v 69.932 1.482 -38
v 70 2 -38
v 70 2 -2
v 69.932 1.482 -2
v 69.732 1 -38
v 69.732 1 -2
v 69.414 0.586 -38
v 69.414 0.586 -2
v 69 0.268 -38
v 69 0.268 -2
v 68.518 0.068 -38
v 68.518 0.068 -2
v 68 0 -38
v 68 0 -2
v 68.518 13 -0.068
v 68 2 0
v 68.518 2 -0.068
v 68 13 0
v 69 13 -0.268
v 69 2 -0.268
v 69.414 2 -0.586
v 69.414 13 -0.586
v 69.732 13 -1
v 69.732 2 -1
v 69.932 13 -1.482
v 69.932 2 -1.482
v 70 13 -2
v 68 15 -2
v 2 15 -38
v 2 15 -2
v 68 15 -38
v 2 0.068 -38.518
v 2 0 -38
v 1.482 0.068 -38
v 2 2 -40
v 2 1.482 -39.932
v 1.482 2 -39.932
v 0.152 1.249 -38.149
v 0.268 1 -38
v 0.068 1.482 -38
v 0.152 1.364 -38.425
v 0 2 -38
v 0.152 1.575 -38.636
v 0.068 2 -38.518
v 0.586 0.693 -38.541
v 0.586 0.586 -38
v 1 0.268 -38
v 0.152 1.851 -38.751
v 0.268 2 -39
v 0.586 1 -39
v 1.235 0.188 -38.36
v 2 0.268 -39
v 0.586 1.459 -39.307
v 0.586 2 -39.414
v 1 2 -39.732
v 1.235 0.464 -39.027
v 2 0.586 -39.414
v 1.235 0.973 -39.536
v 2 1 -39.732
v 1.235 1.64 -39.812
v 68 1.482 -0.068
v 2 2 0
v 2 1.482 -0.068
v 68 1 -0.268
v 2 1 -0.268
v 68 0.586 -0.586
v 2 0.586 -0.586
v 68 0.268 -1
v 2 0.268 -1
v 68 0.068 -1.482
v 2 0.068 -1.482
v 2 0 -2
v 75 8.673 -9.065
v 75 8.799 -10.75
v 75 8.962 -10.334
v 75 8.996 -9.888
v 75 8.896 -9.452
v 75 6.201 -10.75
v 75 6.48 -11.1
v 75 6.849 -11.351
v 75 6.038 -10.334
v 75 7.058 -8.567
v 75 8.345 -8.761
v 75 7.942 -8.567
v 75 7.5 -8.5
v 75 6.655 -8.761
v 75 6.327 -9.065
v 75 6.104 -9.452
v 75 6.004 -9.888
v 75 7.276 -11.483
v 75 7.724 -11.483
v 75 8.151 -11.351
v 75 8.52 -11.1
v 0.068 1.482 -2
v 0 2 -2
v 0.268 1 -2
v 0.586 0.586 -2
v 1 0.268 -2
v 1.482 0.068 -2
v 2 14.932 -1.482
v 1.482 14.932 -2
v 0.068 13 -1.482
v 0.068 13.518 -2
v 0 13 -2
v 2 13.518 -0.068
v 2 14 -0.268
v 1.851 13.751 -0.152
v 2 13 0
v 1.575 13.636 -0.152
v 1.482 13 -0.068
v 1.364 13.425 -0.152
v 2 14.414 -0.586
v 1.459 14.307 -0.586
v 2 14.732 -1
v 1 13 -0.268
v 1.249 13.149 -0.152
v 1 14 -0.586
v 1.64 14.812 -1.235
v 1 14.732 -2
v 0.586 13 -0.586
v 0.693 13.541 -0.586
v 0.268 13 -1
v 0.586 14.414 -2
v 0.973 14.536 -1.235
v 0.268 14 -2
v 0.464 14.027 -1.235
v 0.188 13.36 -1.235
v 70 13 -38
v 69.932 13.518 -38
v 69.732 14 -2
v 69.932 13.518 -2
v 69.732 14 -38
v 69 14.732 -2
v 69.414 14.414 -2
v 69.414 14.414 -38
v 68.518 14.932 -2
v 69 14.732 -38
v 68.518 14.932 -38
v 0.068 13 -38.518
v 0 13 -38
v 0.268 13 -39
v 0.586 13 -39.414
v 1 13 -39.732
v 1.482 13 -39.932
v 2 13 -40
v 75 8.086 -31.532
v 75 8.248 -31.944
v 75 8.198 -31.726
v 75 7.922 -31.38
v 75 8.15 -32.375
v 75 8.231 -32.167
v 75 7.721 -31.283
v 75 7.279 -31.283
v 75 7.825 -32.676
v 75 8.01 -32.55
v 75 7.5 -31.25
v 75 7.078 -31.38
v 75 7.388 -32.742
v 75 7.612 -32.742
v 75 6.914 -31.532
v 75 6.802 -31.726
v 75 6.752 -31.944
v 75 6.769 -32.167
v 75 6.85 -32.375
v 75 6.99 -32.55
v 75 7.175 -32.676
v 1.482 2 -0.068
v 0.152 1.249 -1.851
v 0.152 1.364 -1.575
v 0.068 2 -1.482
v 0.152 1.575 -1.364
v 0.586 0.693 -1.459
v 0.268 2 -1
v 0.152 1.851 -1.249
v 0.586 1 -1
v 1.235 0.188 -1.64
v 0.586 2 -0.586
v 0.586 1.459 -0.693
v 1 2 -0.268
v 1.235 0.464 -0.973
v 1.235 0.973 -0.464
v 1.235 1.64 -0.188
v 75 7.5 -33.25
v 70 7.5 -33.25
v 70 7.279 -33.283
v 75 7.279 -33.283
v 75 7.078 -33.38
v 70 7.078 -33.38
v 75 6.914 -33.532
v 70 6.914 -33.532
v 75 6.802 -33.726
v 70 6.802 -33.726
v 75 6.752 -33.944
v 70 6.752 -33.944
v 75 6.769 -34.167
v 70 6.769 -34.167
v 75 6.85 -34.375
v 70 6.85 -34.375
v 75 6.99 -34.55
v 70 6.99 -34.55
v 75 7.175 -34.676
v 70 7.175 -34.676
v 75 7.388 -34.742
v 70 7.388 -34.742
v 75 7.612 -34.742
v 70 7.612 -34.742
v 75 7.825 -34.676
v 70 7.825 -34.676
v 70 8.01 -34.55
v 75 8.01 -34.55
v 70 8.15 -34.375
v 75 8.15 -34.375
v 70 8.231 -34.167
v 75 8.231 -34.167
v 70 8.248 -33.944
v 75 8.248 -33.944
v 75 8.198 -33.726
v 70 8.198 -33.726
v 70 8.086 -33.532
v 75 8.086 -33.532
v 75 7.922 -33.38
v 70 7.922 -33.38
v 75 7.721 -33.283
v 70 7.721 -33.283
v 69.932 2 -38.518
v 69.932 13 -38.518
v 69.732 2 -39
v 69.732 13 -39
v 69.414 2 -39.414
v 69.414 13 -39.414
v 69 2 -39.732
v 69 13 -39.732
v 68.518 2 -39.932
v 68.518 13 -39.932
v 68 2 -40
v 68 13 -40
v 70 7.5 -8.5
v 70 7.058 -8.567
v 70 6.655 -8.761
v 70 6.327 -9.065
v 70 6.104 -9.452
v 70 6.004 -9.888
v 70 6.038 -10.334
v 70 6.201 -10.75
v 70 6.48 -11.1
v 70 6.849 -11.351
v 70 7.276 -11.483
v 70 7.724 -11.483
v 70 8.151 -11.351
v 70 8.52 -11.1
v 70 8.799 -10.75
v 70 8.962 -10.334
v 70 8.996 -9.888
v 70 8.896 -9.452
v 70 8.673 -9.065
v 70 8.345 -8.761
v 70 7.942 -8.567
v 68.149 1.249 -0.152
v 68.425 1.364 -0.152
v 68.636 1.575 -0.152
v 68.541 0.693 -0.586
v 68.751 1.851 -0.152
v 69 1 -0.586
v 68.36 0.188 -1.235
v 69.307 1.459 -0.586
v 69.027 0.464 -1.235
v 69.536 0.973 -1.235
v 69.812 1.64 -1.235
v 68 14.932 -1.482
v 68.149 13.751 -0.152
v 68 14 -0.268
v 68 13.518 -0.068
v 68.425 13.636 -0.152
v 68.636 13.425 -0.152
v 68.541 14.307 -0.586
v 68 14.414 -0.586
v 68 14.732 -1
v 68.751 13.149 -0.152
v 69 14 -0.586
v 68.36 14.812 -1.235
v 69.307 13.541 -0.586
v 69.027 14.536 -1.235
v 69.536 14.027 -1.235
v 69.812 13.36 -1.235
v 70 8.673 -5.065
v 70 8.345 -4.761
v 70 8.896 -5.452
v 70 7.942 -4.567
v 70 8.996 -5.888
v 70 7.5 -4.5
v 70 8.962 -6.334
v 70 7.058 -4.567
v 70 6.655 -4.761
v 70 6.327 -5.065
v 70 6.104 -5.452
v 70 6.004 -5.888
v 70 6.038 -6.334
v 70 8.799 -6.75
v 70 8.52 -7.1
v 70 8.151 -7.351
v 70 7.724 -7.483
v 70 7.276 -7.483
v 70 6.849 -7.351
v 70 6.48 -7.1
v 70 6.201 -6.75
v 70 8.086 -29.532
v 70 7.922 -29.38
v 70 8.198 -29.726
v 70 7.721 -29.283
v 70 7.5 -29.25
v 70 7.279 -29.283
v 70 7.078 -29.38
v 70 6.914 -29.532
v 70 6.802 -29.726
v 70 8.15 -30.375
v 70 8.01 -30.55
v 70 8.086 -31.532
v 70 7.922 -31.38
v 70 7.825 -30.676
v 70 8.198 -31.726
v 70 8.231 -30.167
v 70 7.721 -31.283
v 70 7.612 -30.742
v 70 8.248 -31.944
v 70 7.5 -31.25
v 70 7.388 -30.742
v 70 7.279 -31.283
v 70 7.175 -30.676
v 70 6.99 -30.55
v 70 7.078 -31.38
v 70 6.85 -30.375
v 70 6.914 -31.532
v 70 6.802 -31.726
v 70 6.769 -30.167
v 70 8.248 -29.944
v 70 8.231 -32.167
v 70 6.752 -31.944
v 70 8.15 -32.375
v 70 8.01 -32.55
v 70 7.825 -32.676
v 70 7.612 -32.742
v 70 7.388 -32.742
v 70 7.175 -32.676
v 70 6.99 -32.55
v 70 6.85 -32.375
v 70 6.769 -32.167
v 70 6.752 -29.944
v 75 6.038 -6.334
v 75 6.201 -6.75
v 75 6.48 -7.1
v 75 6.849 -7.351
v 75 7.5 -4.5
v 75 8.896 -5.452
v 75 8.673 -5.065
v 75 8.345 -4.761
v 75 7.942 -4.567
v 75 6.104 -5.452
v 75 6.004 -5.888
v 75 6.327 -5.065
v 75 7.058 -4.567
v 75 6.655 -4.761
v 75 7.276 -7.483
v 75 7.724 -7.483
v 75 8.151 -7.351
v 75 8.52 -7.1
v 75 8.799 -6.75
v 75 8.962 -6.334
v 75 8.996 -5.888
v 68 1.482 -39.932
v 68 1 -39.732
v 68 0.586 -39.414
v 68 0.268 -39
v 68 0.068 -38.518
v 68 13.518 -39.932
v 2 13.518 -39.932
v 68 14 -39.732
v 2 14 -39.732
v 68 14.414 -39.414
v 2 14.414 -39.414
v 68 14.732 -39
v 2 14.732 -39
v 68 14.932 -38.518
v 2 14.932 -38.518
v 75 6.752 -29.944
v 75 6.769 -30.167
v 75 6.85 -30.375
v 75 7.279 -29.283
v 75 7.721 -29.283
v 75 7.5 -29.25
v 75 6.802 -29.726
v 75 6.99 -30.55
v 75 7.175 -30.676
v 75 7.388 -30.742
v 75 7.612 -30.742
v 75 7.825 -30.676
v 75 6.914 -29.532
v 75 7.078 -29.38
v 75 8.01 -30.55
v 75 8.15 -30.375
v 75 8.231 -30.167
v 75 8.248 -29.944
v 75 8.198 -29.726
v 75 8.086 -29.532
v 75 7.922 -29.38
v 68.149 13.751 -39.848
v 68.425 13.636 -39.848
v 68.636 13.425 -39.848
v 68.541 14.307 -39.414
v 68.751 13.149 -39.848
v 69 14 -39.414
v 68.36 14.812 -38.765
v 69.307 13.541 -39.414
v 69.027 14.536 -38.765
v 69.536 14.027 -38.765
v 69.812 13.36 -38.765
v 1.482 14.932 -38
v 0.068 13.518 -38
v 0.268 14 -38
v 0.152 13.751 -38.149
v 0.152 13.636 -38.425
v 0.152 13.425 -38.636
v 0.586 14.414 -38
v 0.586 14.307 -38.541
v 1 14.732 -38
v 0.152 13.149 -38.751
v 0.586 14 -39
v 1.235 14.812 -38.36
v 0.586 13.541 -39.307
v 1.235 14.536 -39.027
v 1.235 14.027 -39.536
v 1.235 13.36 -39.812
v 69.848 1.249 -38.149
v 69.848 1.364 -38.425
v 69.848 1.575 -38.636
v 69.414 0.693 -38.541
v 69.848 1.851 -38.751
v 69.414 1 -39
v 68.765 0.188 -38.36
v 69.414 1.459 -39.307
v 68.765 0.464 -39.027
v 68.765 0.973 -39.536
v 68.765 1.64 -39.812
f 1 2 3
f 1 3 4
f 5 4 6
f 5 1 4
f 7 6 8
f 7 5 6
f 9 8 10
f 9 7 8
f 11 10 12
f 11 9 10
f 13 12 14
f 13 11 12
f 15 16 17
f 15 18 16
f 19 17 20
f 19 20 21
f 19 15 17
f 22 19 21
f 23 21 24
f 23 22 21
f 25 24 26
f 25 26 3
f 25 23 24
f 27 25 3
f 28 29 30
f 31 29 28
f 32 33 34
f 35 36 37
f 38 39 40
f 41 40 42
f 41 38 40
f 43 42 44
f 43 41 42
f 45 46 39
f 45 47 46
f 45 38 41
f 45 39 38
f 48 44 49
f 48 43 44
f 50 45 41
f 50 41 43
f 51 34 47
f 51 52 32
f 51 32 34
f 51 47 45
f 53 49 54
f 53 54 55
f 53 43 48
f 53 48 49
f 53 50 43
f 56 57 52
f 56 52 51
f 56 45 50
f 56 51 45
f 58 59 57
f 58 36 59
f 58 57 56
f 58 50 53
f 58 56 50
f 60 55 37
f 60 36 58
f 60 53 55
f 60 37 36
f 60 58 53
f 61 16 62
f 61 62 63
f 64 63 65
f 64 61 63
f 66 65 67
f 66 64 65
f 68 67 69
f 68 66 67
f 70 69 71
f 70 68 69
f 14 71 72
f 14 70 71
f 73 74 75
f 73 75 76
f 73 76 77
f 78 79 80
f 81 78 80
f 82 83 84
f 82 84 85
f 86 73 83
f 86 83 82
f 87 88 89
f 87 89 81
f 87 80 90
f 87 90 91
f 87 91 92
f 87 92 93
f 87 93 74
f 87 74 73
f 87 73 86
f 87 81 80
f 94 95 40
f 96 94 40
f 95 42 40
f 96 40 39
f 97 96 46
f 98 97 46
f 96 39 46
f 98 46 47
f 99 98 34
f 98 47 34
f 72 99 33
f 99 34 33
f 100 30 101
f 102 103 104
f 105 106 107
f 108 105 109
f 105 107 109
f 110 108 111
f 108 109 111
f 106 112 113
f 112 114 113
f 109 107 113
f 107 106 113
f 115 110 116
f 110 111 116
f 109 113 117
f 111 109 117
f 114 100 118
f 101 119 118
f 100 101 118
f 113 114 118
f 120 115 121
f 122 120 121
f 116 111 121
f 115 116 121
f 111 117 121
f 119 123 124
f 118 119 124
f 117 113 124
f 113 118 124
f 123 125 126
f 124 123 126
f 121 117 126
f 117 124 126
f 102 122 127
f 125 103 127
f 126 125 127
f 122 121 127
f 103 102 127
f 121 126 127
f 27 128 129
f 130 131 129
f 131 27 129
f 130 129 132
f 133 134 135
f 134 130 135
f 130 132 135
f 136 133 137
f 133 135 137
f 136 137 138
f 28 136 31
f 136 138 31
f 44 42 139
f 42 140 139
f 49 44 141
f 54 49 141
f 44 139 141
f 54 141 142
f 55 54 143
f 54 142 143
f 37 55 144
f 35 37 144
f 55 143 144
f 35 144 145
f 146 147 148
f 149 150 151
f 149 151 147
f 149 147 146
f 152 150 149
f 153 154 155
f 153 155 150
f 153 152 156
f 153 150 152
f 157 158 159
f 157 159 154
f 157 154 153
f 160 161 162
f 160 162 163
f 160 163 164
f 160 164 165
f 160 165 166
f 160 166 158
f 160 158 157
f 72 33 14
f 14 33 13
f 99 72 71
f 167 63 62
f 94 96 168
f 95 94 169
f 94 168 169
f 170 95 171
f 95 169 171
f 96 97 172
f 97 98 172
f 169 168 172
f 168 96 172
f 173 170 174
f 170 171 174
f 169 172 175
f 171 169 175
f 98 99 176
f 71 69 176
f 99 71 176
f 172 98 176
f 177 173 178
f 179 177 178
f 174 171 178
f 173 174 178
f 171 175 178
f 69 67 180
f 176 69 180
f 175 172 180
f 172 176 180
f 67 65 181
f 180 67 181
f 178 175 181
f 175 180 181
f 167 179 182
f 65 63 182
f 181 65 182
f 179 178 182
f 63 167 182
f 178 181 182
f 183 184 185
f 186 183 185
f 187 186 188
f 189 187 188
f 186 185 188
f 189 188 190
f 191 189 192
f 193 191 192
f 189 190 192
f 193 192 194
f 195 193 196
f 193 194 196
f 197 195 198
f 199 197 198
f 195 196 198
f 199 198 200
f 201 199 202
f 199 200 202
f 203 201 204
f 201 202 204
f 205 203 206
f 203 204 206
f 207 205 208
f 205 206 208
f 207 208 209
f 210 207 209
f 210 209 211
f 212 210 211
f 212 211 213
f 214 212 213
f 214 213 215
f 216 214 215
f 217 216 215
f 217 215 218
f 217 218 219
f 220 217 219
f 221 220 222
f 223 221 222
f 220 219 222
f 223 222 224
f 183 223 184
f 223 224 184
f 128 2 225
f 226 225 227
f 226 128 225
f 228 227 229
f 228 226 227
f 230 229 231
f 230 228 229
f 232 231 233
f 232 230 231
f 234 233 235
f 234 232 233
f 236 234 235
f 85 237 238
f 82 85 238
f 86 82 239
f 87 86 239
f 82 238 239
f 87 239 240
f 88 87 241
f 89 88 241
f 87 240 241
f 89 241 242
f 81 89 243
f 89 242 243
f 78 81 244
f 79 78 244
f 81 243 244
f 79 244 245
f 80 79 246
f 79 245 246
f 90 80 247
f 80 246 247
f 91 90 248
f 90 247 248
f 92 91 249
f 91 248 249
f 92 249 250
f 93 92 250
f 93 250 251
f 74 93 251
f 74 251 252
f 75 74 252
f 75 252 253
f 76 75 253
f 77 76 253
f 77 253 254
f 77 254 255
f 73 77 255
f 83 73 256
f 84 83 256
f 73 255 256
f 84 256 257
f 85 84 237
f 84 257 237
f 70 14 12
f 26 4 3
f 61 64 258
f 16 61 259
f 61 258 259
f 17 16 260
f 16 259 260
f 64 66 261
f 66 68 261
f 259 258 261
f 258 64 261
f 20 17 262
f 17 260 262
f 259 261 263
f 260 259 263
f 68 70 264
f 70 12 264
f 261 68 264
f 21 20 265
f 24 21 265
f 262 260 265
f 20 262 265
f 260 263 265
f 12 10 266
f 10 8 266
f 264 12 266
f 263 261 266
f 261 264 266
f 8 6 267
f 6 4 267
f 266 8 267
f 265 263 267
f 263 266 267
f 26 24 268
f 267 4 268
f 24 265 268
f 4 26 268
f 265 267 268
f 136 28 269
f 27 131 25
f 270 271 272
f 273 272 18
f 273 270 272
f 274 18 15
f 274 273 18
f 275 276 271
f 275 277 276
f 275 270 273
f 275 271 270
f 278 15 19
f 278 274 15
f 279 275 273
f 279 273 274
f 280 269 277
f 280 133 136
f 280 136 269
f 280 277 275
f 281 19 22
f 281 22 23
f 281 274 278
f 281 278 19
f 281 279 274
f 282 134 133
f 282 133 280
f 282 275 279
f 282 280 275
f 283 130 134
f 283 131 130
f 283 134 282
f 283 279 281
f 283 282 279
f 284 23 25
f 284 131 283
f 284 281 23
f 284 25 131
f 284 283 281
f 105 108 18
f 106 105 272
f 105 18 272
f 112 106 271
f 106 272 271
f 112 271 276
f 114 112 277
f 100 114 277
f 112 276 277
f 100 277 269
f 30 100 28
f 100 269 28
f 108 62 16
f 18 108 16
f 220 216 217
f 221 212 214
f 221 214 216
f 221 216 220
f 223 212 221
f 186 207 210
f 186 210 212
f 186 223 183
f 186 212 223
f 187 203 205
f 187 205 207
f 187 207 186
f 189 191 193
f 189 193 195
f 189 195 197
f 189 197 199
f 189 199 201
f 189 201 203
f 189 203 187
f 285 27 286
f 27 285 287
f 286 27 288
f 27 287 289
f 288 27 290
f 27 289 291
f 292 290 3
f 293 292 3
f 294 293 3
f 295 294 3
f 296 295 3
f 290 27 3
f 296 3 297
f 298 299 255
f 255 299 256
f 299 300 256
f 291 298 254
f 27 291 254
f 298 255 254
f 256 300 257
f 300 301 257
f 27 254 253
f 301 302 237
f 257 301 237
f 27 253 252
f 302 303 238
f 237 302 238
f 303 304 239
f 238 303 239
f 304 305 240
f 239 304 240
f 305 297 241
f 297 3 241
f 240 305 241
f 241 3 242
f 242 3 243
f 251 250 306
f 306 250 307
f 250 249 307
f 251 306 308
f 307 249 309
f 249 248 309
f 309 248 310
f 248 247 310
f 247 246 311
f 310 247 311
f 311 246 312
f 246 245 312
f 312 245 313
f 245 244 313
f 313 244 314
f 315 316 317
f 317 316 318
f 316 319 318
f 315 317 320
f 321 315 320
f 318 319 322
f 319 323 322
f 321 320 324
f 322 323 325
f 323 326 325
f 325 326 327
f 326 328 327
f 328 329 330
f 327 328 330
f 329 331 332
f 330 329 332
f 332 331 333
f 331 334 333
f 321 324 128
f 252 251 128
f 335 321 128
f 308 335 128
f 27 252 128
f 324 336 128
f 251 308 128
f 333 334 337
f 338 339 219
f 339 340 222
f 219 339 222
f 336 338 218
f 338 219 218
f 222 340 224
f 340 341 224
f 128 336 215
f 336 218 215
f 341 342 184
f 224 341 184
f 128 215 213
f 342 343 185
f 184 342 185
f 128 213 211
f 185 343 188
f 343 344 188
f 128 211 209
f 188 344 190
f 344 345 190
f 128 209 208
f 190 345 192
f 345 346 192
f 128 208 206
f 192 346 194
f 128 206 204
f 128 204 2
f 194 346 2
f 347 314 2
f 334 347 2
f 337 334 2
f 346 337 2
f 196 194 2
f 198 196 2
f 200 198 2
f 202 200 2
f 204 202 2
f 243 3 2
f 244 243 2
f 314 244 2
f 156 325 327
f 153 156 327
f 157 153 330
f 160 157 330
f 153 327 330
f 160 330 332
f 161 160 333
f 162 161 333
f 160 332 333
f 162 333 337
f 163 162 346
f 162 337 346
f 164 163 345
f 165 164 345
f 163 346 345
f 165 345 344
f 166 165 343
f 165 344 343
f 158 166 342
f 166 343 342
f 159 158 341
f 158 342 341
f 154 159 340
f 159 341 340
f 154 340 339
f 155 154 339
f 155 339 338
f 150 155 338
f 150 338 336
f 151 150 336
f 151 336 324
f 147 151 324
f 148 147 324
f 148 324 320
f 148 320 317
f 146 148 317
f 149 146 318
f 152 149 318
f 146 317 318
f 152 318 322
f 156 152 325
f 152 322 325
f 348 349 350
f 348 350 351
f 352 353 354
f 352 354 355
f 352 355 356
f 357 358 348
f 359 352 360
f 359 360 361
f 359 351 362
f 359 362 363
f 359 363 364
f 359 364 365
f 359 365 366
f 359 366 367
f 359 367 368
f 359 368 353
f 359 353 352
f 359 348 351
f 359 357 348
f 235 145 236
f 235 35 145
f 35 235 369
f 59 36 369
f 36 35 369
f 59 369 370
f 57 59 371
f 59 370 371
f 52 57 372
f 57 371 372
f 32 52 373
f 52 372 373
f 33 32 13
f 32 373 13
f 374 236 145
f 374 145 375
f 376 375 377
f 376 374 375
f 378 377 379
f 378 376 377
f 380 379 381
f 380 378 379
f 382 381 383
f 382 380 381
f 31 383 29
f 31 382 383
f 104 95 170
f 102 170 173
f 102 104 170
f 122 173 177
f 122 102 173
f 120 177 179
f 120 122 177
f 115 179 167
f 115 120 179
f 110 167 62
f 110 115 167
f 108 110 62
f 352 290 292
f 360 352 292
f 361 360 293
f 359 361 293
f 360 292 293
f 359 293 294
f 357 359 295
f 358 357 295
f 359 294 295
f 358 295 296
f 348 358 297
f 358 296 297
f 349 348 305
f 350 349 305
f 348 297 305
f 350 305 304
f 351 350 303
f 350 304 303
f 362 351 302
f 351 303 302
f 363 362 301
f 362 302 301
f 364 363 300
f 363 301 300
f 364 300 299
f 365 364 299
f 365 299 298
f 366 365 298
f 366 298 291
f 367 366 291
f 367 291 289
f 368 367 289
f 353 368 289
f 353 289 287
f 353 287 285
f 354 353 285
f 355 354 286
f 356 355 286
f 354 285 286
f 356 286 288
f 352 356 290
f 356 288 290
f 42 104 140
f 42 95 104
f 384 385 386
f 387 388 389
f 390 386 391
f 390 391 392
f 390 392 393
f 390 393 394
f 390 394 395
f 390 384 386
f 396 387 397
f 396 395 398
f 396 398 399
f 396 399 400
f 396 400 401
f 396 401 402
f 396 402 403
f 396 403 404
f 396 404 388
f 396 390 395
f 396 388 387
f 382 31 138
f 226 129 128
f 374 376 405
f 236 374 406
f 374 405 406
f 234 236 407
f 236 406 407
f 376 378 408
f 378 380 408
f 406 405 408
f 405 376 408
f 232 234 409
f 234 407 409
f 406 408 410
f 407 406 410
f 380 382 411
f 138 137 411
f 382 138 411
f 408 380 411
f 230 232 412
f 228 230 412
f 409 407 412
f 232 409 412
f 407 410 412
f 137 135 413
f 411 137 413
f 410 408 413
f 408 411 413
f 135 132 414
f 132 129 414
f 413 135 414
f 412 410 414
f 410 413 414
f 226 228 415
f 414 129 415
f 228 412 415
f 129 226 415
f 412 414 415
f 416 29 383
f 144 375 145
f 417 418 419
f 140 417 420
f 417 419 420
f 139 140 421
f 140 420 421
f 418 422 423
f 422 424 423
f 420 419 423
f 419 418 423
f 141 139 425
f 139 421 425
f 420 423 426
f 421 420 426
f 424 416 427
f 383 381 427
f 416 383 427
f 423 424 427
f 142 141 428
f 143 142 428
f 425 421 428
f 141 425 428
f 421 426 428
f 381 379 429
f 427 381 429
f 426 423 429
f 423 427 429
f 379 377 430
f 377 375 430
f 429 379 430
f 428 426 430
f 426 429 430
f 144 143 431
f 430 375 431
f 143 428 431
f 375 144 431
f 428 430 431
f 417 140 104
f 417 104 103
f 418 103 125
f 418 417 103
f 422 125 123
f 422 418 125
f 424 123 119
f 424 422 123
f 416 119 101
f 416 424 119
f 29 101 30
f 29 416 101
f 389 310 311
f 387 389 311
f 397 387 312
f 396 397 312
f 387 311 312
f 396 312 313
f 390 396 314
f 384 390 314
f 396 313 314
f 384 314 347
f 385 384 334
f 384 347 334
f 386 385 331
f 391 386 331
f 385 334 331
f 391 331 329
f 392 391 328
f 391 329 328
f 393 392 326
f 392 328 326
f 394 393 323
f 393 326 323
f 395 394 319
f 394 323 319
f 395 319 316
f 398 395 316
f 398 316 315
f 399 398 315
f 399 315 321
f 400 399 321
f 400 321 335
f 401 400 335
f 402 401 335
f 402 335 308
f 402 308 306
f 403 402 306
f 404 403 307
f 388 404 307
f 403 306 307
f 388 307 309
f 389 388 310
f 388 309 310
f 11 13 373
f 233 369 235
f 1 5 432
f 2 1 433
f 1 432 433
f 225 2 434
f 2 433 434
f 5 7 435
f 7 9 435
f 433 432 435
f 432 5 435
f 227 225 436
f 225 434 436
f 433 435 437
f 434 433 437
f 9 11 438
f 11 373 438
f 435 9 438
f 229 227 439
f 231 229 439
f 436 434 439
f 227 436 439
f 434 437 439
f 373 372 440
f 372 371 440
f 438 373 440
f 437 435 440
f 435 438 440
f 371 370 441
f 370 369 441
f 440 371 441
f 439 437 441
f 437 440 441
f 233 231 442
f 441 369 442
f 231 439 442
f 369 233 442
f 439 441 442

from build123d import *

# Parameters (mm, degrees)
ESQUISSE1_W      = 70
ESQUISSE1_H      = 40
EXTRUSION1_DEPTH = 15
CONG_1_R         = 2
ESQUISSE2_R      = 1.5
ESQUISSE2_R_2    = 0.75
EXTRUSION2_DEPTH = 5


with BuildPart() as part:
    # Esquisse1 → Extrusion1 (new body)
    with BuildSketch(Plane(origin=(0, 0, 0), x_dir=(1, 0, 0), z_dir=(0, 1, 0))):
        with Locations((35, 20)):
            Rectangle(ESQUISSE1_W, ESQUISSE1_H)
    extrude(amount=EXTRUSION1_DEPTH)

    # Congé1
    cong_1_edges = [part.edges().sort_by_distance(p)[0] for p in [
        (70, 15, -20),
        (35, 15, -40),
        (0, 15, -20),
        (35, 0, -40),
        (70, 0, -20),
        (35, 0, 0),
        (0, 0, -20),
        (35, 15, 0),
        (0, 7.5, -40),
        (70, 7.5, -40),
        (70, 7.5, 0),
        (0, 7.5, 0),
    ]]
    fillet(cong_1_edges, radius=CONG_1_R)

    # Esquisse2 → Extrusion2 (add)
    with BuildSketch(Plane(origin=(70, 0, 0), x_dir=(0, 0, -1), z_dir=(1, 0, 0))):
        with Locations(Location((6, 7.5, 0), (0, 0, 180))):
            Circle(ESQUISSE2_R)
        with Locations(Location((10, 7.5, 0), (0, 0, 180))):
            Circle(ESQUISSE2_R)
        with Locations(Location((30, 7.5, 0), (0, 0, 180))):
            Circle(ESQUISSE2_R_2)
        with Locations(Location((32, 7.5, 0), (0, 0, 180))):
            Circle(ESQUISSE2_R_2)
        with Locations(Location((34, 7.5, 0), (0, 0, 180))):
            Circle(ESQUISSE2_R_2)
    extrude(amount=EXTRUSION2_DEPTH)


solid = part.part
